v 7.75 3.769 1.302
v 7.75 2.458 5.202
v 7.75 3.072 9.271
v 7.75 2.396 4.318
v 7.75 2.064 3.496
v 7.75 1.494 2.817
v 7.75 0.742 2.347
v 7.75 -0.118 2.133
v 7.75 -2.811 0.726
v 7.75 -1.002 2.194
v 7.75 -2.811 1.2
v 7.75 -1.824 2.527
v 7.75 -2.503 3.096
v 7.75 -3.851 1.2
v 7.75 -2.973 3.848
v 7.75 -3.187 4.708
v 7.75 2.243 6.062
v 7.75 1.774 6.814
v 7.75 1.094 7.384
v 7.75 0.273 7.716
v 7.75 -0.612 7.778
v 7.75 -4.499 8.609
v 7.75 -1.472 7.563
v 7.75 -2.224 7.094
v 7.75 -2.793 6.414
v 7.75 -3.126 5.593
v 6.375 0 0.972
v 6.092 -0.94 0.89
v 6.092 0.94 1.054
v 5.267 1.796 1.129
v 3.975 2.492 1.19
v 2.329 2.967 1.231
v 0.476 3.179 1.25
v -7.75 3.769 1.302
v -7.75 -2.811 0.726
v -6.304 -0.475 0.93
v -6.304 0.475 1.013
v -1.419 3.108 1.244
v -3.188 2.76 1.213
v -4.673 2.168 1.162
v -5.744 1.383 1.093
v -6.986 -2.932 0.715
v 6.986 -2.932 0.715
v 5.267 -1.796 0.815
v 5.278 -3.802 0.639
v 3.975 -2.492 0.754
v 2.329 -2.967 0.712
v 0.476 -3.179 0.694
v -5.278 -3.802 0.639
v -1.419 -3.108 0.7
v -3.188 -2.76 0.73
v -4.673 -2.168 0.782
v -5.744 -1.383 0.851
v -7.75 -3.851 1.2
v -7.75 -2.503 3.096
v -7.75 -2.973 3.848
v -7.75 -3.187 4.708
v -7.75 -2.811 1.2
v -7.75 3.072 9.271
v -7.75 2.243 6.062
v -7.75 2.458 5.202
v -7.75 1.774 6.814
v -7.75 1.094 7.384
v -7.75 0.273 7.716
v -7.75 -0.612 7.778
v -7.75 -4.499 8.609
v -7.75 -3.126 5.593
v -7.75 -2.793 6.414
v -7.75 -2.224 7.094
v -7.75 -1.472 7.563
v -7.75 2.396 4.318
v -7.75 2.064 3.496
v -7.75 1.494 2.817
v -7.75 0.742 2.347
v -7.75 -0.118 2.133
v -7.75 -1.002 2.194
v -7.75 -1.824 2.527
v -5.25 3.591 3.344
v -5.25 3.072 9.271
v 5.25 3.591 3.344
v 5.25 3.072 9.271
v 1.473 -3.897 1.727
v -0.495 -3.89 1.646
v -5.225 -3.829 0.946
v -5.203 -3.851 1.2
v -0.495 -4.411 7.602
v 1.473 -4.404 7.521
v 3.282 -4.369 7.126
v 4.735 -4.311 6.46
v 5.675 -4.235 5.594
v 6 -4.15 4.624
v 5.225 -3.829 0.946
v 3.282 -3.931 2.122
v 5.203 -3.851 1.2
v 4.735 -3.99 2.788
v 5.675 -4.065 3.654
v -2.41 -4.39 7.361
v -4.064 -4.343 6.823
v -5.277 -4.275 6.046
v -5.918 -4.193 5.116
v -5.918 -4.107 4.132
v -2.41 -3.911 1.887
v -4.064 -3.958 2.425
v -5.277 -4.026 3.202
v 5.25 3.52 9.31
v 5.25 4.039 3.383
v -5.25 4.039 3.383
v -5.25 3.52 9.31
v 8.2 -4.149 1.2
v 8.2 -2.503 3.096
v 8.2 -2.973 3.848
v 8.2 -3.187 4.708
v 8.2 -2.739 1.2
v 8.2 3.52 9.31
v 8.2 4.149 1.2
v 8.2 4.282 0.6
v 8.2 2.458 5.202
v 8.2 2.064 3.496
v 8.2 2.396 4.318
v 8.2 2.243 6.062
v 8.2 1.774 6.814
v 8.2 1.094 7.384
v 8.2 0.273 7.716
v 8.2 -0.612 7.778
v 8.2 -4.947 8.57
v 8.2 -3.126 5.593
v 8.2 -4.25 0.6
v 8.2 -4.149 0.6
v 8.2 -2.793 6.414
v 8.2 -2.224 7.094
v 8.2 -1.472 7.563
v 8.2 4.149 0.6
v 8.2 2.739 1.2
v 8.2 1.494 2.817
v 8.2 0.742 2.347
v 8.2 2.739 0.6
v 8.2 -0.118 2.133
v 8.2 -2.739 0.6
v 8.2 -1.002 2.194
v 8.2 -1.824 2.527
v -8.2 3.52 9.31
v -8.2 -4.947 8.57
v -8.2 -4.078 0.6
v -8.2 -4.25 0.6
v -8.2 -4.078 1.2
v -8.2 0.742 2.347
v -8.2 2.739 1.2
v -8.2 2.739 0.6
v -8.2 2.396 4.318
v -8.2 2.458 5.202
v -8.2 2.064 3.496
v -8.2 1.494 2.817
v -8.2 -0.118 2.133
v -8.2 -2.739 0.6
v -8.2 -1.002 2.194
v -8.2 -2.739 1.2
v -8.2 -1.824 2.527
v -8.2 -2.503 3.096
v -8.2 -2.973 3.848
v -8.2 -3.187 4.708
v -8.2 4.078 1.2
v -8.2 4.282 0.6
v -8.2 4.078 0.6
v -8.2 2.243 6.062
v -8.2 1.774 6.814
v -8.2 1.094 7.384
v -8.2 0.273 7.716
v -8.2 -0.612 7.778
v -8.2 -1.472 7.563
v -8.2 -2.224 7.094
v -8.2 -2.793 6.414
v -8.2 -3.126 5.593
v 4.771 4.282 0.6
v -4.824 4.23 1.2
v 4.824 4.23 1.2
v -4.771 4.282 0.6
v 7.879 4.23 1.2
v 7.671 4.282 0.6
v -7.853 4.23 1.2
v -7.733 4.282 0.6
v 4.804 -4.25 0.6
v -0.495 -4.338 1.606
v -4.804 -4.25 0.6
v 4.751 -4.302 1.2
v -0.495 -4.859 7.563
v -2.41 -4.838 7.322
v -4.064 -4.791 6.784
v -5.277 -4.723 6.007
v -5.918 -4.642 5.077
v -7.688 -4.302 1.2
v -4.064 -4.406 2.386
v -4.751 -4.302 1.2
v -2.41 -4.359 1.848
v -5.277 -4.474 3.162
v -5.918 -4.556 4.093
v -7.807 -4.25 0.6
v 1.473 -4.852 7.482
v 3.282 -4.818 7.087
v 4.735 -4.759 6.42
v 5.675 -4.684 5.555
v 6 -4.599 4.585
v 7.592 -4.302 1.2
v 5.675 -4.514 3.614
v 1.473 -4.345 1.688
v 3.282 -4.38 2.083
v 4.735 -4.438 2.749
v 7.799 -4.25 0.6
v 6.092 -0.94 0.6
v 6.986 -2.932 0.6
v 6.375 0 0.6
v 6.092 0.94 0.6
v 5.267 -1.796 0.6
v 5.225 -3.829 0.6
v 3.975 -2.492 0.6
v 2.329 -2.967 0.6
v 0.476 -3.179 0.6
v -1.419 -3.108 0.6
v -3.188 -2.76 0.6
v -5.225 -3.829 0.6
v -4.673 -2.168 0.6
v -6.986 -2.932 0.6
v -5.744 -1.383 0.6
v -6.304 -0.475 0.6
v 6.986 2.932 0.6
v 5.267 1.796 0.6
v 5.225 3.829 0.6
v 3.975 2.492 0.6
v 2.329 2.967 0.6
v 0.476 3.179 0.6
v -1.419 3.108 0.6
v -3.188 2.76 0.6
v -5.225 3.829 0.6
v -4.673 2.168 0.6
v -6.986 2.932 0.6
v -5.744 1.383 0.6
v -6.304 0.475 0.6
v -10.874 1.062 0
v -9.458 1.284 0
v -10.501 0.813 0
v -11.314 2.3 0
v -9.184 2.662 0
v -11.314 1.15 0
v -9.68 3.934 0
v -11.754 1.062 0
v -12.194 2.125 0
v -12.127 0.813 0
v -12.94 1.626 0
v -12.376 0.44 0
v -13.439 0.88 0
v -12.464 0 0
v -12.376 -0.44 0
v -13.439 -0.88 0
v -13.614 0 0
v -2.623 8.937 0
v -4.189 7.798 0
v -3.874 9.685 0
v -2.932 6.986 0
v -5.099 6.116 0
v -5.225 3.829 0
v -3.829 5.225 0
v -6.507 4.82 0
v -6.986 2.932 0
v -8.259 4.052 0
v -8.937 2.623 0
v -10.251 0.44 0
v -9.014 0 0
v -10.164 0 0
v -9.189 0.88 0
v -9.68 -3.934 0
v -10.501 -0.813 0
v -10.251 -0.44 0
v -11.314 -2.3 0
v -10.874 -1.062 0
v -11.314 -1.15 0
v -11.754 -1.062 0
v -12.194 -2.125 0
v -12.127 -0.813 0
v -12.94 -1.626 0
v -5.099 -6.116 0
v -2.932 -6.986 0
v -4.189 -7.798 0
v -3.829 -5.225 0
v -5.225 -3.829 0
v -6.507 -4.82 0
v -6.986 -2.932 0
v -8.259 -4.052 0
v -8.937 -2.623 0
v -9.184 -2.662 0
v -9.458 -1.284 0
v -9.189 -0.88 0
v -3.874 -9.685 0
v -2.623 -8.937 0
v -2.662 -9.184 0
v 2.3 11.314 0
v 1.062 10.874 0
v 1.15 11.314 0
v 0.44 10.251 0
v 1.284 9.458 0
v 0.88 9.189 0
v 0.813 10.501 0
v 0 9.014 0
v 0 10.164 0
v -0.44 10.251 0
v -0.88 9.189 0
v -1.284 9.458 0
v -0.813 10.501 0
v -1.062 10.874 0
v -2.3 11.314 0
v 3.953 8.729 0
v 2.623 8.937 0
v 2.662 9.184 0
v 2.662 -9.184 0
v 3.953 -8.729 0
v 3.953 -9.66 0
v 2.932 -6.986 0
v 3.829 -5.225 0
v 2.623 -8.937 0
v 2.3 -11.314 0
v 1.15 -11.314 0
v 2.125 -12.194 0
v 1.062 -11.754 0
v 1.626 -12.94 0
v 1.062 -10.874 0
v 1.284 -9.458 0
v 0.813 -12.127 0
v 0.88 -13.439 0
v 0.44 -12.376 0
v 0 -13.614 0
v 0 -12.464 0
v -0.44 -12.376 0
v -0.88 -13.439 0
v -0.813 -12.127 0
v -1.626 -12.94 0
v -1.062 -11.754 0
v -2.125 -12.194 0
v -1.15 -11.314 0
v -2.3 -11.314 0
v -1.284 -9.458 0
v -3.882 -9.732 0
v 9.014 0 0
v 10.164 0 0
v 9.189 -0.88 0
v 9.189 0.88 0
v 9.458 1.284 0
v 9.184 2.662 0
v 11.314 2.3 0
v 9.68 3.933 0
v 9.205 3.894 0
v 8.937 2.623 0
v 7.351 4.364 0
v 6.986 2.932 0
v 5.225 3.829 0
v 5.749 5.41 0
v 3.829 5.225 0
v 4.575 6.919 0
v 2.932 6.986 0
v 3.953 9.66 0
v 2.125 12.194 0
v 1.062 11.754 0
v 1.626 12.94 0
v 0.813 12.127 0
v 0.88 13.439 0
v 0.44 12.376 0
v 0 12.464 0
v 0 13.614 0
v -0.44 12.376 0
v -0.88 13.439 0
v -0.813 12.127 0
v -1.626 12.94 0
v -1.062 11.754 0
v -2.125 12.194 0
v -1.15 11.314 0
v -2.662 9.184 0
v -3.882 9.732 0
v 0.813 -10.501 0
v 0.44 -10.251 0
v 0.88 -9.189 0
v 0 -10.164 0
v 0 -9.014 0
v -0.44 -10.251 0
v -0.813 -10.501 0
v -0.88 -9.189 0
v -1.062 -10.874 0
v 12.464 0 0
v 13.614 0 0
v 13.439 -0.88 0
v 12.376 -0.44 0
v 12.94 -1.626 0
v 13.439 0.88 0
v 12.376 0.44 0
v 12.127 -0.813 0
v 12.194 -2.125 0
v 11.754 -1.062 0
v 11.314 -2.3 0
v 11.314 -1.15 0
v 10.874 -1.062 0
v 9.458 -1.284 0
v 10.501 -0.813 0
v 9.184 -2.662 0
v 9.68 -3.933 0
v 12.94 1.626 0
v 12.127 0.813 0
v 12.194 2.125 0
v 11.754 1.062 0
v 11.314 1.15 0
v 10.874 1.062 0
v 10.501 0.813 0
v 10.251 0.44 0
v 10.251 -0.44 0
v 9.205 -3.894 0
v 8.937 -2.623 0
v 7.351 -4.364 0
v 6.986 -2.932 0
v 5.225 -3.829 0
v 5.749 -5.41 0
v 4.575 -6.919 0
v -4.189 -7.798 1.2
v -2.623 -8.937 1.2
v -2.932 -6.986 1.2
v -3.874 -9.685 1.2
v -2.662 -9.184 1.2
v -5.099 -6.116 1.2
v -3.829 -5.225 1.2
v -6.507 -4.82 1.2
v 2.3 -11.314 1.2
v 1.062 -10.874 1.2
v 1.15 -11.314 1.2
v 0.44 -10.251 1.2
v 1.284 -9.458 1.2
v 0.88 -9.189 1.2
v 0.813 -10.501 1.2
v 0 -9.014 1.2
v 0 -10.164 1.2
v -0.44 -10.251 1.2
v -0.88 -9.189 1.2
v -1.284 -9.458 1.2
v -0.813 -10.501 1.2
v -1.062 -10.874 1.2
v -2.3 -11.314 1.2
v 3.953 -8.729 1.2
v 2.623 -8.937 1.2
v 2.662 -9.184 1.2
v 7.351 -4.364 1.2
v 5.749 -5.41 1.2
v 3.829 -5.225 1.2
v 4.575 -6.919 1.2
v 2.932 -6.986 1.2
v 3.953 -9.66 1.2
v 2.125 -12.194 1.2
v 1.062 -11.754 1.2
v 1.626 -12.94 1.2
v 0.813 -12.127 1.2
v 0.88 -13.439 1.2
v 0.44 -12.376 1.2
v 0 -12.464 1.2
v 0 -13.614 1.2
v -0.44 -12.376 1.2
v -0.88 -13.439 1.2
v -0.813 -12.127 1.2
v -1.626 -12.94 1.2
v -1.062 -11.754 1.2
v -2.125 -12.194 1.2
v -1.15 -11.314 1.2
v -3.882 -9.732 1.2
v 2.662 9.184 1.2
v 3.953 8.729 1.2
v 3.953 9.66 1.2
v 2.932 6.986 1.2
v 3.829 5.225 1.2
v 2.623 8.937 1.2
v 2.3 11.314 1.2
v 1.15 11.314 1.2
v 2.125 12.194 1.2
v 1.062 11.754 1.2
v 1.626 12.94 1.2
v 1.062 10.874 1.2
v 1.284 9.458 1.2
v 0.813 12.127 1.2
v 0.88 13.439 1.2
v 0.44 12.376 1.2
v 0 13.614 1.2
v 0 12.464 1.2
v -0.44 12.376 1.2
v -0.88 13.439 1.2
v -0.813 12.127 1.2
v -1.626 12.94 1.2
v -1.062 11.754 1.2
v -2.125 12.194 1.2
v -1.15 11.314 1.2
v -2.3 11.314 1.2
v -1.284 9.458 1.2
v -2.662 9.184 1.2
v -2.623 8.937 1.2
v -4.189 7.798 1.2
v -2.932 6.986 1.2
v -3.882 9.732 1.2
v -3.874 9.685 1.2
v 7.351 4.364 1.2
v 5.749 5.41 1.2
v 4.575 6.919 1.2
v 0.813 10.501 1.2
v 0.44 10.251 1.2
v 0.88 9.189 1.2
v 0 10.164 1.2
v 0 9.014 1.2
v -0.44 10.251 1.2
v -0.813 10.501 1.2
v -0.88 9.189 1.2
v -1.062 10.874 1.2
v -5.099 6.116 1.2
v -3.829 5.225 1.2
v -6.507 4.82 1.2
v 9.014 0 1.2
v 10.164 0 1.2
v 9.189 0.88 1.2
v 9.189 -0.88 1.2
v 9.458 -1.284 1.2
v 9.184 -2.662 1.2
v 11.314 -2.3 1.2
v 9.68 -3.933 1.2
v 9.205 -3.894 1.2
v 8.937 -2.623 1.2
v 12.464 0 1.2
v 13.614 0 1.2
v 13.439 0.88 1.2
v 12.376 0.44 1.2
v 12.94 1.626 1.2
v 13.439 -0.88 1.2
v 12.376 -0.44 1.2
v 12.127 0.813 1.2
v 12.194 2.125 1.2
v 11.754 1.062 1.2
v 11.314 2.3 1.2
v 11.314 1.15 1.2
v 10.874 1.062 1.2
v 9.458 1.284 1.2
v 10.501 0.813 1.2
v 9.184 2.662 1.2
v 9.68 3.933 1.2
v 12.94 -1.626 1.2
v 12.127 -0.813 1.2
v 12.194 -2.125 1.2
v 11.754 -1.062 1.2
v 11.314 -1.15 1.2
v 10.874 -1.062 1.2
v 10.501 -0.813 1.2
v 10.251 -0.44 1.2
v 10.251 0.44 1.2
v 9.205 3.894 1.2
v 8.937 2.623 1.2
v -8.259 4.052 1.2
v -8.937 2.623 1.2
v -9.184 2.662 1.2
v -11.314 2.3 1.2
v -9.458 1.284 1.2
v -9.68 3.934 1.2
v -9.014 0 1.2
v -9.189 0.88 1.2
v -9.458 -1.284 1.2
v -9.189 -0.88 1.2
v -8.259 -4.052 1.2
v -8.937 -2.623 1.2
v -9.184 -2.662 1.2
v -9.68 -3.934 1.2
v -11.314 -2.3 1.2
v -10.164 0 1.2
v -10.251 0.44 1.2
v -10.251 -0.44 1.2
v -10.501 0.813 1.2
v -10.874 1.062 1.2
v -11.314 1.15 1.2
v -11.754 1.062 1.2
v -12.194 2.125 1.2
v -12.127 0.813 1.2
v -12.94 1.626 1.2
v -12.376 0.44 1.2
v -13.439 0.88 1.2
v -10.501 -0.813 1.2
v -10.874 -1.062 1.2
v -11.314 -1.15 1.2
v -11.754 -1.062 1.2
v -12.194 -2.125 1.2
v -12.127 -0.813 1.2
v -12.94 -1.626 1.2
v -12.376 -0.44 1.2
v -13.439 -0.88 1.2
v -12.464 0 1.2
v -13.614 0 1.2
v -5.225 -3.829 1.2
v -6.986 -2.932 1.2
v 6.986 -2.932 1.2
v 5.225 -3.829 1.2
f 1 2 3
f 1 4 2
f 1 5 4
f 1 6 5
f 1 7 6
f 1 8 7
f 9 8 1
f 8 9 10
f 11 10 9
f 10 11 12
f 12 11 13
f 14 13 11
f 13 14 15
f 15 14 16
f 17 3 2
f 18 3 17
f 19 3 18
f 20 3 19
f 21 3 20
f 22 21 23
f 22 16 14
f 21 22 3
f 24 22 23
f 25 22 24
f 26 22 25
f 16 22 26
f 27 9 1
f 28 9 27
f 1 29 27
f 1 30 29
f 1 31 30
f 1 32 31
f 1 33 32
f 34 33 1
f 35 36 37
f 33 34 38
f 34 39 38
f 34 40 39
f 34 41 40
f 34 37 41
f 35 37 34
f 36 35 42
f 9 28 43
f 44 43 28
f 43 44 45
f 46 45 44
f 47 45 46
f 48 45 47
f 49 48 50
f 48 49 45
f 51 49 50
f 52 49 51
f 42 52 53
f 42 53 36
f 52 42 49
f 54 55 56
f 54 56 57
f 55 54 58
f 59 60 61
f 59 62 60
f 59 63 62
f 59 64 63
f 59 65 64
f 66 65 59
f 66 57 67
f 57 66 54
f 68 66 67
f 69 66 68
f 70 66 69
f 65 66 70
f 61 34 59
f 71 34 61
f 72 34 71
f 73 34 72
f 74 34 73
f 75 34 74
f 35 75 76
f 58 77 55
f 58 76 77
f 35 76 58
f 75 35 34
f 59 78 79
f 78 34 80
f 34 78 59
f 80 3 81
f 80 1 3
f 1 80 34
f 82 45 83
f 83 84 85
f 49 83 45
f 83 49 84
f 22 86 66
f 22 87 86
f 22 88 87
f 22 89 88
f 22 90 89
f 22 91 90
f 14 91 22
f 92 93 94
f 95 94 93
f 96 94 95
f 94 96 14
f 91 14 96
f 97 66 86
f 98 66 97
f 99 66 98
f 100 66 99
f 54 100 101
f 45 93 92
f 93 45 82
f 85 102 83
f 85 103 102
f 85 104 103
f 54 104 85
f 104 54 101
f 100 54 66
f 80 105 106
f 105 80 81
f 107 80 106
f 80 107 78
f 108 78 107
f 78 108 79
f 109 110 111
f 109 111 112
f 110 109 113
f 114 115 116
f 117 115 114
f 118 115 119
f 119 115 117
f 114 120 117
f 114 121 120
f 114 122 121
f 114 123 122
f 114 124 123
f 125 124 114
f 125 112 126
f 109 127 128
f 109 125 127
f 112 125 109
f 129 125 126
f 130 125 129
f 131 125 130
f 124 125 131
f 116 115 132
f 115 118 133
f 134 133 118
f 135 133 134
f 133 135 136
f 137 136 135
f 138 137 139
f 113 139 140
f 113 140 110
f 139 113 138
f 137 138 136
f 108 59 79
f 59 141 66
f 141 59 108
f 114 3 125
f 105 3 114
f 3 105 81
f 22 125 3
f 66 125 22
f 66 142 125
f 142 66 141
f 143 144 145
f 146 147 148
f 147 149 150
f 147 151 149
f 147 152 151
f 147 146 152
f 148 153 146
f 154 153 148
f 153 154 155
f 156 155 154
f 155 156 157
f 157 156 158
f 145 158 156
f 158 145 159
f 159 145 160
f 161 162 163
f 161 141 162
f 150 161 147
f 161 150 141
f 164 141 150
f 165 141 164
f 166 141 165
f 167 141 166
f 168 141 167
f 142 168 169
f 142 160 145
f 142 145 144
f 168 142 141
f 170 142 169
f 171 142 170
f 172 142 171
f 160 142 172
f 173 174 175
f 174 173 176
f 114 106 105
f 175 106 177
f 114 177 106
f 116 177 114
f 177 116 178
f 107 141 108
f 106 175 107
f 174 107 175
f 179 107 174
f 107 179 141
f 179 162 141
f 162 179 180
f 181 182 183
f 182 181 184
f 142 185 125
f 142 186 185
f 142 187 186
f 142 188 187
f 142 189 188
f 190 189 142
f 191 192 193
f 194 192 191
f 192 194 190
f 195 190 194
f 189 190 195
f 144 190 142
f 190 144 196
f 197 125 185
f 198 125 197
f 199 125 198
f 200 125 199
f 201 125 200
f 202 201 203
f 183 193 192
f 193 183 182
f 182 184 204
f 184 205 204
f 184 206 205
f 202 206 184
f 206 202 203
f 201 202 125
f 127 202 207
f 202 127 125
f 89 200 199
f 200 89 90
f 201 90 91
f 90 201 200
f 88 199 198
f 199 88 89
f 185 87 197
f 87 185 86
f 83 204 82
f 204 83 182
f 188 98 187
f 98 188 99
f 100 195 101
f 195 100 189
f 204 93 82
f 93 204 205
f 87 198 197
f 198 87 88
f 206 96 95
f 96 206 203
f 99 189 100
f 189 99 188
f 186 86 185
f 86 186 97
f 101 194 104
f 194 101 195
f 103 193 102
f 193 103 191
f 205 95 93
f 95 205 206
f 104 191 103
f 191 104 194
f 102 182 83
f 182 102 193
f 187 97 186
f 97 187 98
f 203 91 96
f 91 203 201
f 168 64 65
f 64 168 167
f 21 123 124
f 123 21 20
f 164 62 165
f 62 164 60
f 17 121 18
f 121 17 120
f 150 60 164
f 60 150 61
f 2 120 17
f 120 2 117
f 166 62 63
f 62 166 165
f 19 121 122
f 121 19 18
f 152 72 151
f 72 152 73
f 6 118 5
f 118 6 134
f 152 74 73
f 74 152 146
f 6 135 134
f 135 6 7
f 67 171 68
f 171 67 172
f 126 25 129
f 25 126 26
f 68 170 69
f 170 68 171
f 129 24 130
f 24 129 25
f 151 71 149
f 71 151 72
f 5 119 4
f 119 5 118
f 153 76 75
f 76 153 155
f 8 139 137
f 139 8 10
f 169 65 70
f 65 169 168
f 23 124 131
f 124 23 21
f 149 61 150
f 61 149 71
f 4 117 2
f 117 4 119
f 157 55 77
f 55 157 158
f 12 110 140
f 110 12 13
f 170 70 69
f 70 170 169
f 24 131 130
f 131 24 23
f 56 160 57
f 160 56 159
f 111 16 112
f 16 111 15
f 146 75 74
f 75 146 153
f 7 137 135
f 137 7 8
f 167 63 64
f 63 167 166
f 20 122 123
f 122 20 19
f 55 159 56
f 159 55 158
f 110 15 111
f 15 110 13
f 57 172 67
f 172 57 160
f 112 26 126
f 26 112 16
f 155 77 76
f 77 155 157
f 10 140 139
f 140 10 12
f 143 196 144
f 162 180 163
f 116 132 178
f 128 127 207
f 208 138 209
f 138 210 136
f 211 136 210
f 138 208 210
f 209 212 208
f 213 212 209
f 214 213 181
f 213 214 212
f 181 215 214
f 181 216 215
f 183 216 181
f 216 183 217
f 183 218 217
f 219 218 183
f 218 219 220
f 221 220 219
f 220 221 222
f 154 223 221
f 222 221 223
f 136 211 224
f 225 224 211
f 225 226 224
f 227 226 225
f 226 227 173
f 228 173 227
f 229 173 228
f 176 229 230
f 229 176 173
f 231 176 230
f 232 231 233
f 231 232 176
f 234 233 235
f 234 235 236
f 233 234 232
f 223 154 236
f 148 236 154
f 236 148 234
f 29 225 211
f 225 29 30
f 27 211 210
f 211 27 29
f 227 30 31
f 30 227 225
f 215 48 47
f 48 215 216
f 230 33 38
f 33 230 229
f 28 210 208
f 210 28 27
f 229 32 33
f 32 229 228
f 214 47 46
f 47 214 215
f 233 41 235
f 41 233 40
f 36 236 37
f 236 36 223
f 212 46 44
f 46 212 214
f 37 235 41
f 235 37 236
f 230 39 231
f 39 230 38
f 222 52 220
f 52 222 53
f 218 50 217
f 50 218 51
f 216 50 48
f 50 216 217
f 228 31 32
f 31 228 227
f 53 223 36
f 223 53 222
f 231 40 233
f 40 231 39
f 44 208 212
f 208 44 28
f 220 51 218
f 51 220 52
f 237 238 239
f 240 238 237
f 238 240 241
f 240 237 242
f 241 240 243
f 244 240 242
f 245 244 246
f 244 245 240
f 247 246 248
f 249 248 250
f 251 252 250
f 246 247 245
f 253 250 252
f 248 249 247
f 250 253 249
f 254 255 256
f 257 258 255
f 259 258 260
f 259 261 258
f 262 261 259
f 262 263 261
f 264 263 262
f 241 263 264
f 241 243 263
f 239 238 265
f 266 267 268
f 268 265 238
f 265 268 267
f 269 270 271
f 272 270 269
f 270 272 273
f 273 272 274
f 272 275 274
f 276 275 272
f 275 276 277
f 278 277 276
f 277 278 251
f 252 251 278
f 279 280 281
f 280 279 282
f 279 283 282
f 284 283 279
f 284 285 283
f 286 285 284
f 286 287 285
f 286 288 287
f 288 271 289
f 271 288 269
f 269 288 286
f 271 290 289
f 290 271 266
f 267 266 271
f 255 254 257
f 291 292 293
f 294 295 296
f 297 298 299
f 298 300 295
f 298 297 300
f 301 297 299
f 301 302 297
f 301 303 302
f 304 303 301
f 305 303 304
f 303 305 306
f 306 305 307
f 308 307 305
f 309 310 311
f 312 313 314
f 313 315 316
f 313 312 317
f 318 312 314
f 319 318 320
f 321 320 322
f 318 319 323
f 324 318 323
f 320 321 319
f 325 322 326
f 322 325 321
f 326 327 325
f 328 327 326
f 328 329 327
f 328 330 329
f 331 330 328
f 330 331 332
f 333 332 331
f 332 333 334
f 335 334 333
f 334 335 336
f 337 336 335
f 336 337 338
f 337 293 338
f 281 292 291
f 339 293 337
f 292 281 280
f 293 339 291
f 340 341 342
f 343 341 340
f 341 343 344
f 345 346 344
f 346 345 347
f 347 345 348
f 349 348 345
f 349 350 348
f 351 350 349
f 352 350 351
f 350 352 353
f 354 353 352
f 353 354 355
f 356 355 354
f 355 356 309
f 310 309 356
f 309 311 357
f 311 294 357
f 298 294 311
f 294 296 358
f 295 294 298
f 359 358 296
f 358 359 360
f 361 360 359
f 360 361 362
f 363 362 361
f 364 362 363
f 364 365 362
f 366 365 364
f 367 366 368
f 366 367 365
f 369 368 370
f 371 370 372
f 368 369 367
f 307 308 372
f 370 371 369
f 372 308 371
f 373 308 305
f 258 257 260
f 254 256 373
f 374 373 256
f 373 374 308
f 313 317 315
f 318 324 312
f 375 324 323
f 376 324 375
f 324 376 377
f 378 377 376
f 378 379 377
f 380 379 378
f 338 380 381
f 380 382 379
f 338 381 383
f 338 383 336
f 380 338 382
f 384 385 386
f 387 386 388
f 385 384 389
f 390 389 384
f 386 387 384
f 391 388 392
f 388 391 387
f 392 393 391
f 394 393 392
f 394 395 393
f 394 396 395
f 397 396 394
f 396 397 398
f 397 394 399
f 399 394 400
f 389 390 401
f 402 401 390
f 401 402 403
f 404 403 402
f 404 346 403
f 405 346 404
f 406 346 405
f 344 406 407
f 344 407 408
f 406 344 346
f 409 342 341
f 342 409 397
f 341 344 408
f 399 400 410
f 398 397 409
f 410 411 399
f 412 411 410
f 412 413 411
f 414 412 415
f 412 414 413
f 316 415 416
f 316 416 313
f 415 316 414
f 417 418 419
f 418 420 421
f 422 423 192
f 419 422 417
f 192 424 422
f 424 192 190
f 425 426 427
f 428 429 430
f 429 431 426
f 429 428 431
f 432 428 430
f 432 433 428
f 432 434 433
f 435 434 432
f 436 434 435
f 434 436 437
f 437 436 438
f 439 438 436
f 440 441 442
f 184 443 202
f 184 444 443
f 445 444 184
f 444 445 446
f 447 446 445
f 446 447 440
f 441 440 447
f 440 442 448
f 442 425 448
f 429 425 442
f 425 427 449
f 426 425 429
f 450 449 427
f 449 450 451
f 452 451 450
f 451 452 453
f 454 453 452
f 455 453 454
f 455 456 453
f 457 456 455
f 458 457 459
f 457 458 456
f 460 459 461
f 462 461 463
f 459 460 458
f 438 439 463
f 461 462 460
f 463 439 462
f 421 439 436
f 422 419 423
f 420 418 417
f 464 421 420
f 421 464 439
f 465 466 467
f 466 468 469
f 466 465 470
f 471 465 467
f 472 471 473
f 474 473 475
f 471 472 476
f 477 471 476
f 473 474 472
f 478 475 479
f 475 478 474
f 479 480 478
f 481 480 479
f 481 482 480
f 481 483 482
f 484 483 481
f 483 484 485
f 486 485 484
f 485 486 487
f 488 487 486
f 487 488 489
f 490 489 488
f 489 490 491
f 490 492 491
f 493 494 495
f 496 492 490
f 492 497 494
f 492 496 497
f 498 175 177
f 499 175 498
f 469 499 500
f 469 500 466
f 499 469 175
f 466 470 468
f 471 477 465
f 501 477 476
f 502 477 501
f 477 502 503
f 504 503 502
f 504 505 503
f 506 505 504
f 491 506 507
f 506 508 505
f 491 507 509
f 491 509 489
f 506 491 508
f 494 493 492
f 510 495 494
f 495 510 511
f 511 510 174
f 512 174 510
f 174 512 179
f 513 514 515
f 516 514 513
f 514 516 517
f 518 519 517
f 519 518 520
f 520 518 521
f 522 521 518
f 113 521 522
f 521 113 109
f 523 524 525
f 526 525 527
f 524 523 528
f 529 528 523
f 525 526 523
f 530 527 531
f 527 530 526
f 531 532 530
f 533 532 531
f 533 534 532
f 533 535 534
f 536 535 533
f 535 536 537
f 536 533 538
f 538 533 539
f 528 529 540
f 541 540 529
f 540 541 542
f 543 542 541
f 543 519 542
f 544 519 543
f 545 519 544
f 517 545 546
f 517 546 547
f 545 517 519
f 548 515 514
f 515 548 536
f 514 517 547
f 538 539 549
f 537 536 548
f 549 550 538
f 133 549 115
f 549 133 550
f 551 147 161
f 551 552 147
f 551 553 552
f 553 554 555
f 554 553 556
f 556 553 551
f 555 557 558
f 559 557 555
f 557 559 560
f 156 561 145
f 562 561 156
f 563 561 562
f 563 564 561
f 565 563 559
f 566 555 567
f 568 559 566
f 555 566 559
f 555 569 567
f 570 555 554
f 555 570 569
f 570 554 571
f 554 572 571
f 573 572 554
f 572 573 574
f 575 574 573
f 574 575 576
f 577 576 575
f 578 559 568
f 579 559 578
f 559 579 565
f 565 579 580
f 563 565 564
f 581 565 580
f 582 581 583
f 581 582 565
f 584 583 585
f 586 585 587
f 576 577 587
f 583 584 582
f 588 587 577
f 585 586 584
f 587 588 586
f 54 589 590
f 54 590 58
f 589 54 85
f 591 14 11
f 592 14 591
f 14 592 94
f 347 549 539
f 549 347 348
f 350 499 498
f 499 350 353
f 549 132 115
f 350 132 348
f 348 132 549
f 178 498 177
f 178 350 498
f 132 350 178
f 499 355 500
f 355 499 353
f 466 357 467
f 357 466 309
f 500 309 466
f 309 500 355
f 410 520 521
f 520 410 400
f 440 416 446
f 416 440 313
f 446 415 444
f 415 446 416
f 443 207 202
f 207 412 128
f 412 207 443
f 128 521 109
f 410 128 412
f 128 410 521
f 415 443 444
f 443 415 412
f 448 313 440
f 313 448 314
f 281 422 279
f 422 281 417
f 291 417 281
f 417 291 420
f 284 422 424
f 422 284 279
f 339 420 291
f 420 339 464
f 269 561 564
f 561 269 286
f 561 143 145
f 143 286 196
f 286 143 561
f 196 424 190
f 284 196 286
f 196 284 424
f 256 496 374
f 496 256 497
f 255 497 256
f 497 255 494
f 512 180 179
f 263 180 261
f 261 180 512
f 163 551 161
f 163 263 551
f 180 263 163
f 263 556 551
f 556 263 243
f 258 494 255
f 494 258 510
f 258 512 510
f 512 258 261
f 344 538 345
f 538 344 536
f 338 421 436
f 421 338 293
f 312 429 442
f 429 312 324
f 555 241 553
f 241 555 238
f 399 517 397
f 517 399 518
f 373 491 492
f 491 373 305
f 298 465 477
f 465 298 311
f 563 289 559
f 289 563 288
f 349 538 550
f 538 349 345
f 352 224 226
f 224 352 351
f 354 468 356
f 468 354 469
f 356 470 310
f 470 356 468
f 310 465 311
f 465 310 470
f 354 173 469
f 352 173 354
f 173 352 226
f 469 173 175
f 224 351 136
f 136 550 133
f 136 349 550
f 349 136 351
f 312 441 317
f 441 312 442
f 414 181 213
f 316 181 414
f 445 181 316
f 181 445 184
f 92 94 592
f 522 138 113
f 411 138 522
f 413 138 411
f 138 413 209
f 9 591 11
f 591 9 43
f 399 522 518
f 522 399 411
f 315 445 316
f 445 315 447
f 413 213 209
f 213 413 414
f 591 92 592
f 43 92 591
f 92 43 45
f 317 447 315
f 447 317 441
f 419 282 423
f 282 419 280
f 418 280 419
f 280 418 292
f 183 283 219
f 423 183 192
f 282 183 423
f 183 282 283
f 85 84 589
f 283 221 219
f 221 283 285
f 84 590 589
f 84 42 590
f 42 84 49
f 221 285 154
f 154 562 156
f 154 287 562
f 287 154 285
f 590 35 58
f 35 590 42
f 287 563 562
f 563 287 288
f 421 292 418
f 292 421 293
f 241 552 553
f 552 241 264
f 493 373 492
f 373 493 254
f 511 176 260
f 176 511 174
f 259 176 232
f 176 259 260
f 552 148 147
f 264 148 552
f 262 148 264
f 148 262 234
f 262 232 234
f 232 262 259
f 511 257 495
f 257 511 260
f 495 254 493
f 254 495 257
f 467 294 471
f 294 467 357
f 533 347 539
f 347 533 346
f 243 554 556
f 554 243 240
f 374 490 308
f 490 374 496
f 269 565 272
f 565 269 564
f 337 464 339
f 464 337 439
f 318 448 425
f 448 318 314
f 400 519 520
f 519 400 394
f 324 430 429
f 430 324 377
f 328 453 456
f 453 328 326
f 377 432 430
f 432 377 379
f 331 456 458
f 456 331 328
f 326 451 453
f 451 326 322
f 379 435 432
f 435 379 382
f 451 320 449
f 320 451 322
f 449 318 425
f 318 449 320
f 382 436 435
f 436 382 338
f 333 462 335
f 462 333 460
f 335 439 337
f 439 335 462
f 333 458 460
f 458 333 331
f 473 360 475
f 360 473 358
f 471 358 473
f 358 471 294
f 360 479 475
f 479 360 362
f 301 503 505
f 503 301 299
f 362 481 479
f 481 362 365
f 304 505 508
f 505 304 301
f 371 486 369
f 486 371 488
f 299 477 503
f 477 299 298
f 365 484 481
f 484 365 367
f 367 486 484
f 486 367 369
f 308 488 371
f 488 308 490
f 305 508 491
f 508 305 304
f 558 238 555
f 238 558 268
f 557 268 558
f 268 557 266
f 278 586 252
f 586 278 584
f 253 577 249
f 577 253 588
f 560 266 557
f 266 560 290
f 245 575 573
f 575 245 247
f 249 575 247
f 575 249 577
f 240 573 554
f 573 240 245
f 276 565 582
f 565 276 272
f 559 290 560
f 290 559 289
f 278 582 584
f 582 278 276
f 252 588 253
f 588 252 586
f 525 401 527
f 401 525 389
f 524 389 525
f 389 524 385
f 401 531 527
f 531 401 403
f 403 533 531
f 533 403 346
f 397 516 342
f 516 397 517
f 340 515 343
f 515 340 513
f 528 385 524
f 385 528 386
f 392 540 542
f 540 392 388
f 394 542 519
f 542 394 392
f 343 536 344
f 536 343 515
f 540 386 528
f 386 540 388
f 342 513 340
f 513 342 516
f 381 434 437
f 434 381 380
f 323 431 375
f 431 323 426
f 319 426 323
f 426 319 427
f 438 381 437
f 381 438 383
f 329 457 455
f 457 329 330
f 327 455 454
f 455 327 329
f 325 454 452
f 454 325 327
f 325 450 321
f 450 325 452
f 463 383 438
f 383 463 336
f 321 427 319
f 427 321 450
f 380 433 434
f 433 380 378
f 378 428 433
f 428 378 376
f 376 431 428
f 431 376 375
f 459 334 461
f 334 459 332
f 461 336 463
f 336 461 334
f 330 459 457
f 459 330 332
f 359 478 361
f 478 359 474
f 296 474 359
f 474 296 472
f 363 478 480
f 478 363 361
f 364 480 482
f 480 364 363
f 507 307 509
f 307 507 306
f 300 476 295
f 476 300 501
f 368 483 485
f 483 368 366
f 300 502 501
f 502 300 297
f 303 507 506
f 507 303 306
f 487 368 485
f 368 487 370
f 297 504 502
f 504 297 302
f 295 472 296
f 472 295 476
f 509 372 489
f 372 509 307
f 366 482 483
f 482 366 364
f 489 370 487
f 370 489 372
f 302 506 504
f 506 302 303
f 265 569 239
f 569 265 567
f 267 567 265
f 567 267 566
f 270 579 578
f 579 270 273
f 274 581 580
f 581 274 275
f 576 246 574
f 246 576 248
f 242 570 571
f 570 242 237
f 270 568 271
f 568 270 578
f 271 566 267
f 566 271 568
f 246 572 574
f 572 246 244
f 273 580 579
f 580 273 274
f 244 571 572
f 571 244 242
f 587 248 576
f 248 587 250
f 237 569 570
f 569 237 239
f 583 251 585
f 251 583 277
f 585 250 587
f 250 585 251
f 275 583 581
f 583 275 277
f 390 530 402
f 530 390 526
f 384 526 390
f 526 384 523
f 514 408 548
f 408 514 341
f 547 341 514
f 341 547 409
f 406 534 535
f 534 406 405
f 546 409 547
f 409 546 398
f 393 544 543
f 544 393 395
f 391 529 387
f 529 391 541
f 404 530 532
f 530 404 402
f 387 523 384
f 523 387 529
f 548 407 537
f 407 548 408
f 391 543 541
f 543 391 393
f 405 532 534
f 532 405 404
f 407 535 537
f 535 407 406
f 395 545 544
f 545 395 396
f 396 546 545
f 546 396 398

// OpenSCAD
/* [Camera box] */

// Camera box angle
CAMERABOX_ANGLE = 5; // 15;
// Camera box height
CAMERABOX_HEIGHT = 8;
// Camera box wall thickness
CAMERABOX_WALL_THICKNESS = 0.9;
// Extra height at bottom of the box
CAMERABOX_ZOFFSET = 0;

/* [Customize camera] */
// Draw camera (debug mode)
//CAMERA_DEBUG="true"; /*
CAMERA_DEBUG="false";
//*/

// Camera width
CAMERA_WIDTH = 15.5;
// Camera depth
CAMERA_DEPTH = 7.6;
// Camera height
CAMERA_HEIGHT = 12.4;

// Lens width
CAMERA_LENS_WIDTH = 10.5;
// Lens height
CAMERA_LENS_HEIGHT = 9.5;
// Lens depth
CAMERA_LENS_DEPTH = 8.5;
// Lens cutout offset X from center of camera
CAMERA_LENS_XOFFSET = 0;
// Lens offset Z from center of camera
CAMERA_LENS_ZOFFSET = 0.6;

// Front capacitor width
CAMERA_CAP_WIDTH=0;
// Front capacitor height
CAMERA_CAP_HEIGHT = 0;
// Front capacitor depth
CAMERA_CAP_DEPTH = 0;
// Front capacitor X offset from center of lens
CAMERA_CAP_XOFFSET = -1.3;
// Front capacitor Y offset from center of the lens
CAMERA_CAP_ZOFFSET = -4.75;

// Rear LCD width
CAMERA_LCD_WIDTH = 0;
// Rear LCD height
CAMERA_LCD_HEIGHT = 0;
// Rear LCD depth
CAMERA_LCD_DEPTH = 0;
// Rear LCD X offset
CAMERA_LCD_XOFFSET = -6;
// Rear LCD Z offset
CAMERA_LCD_ZOFFSET = 1.5;

// Power cord's connector width
CAMERA_POWERCORD_WIDTH=2;
// Power cord's connector height
CAMERA_POWERCORD_HEIGHT=5;
// Power cord's connector depth
CAMERA_POWERCORD_DEPTH=0;
// Power cord's hole X offset
CAMERA_POWERCORD_XOFFSET = 6.75;
// Power cord's hole z offset
CAMERA_POWERCORD_ZOFFSET = -2.2;

/* [Customize Camera box (advanced)] */
// Custom camera box width (empty is default)
CAMERABOX_WIDTH = CAMERA_WIDTH + CAMERABOX_WALL_THICKNESS;
// Custom camera box depth (empty is default)
CAMERABOX_DEPTH = CAMERA_DEPTH + CAMERABOX_WALL_THICKNESS;

/* [Customize support plate] */
// Spacing between frame's holes
PLATE_HOLE_SPACING = 16 * sqrt(2);
// Hole's diameter
PLATE_HOLE_DIAMETER = 2;
// Extra width between frame's holes center and the support plate's outer edge
PLATE_INNER_WIDTH = 1.6;
// height of the plate
PLATE_THICKNESS = 1.2;
// Yaw offset, use 45 for "X" frame, 0 for "+" frame
PLATE_YAW_OFFSET = 0;
// X offset for the plate
PLATE_XOFFSET = 0;
// y offset for the plate
PLATE_YOFFSET = 0;
// z offset for the plate
PLATE_ZOFFSET = PLATE_THICKNESS / 2.0;

/* [Customize support plate (advanced)] */
// Radius of the plate
PLATE_RADIUS = (PLATE_HOLE_SPACING + (PLATE_INNER_WIDTH * 2.0)) / 2.0;

// Outer cut's radius
PLATE_OUTERCUT_RADIUS = 0.45 * PLATE_RADIUS;
// Outer cut's distance from the plate's center
PLATE_OUTERCUT_CENTER_DISTANCE = 0.75 * PLATE_RADIUS;

// Inner radius
PLATE_INNER_RADIUS = (PLATE_HOLE_SPACING - (PLATE_INNER_WIDTH * 2)) / 2.0;
// Inner cut's radius
PLATE_INNERCUT_RADIUS = 0.65 * PLATE_INNER_RADIUS;
// Inner cut's distance from the plate's center
PLATE_INNERCUT_CENTER_DISTANCE = 0.92 * PLATE_INNER_RADIUS;

// Adjustment coefficient for the hole's diameter (makes the hole a bit larger to accomodate higher flow rate)
PLATE_HOLE_DIAMETER_ADJUST = 0.15;

/* RENDER EVERYTHING */
translate([0,0,PLATE_THICKNESS/2]) camerabox();
plate();

/* DRAW PLATE */
module plate() {
                    // Holes
    PLATE_HOLE_RADIUS = ((PLATE_HOLE_DIAMETER * PLATE_HOLE_DIAMETER_ADJUST) + PLATE_HOLE_DIAMETER) / 2;

    translate([PLATE_XOFFSET, PLATE_YOFFSET, PLATE_ZOFFSET])
        rotate([0, 0, PLATE_YAW_OFFSET])
            difference(){
                union(){
                    difference() {
                        // Outer               
                        partialPlate(PLATE_RADIUS, PLATE_THICKNESS, PLATE_OUTERCUT_RADIUS, PLATE_OUTERCUT_CENTER_DISTANCE);
                        // Inner
                        partialPlate(PLATE_INNER_RADIUS, 1.1 * PLATE_THICKNESS, PLATE_INNERCUT_RADIUS, PLATE_INNERCUT_CENTER_DISTANCE);
                        // external cut-outs
                        shf = PLATE_HOLE_RADIUS*2 +PLATE_HOLE_SPACING/2;
                        translate([shf,0,-PLATE_THICKNESS/2]) rotate([0,0,45]) cube([PLATE_HOLE_SPACING,PLATE_HOLE_SPACING*2,1.1 * PLATE_THICKNESS]);
                        
                        rotate ([0,0,90]) translate([shf,0,-PLATE_THICKNESS/2]) rotate([0,0,45]) cube([PLATE_HOLE_SPACING,PLATE_HOLE_SPACING*2,1.1 * PLATE_THICKNESS]);
                        
                       
                        rotate ([0,0,180]) translate([shf,0,-PLATE_THICKNESS/2]) rotate([0,0,45]) cube([PLATE_HOLE_SPACING,PLATE_HOLE_SPACING*2,1.1 * PLATE_THICKNESS]);
                        
                        rotate ([0,0,270]) translate([shf,0,-PLATE_THICKNESS/2]) rotate([0,0,45]) cube([PLATE_HOLE_SPACING,PLATE_HOLE_SPACING*2,1.1 * PLATE_THICKNESS]);
                    }
                 
                    // plate around holes
                    translate([0, -PLATE_HOLE_SPACING / 2.0, 0]) cylinder(r=PLATE_HOLE_RADIUS*2, h=PLATE_THICKNESS, center=true, $fn=16);
                    translate([0, PLATE_HOLE_SPACING / 2.0, 0]) cylinder(r=PLATE_HOLE_RADIUS*2, h=PLATE_THICKNESS, center=true, $fn=16);

                    translate([-PLATE_HOLE_SPACING / 2.0, 0, 0]) cylinder(r=PLATE_HOLE_RADIUS*2, h=PLATE_THICKNESS, center=true, $fn=16);
                    translate([PLATE_HOLE_SPACING / 2.0,0, 0]) cylinder(r=PLATE_HOLE_RADIUS*2, h=PLATE_THICKNESS, center=true, $fn=16);                
                    
                }
                //translate([-PLATE_RADIUS, -CAMERABOX_DEPTH / 2.0 - 2 * PLATE_INNER_WIDTH, -PLATE_ZOFFSET]) cube([PLATE_RADIUS - CAMERABOX_WIDTH / 2.0, CAMERABOX_DEPTH+ 4 * PLATE_INNER_WIDTH, PLATE_THICKNESS]);
                //translate([CAMERABOX_WIDTH/2, -CAMERABOX_DEPTH / 2.0 - 2 * PLATE_INNER_WIDTH, -PLATE_ZOFFSET])cube([PLATE_RADIUS - CAMERABOX_WIDTH / 2.0, CAMERABOX_DEPTH+ 4 * PLATE_INNER_WIDTH, PLATE_THICKNESS]);
                // holes
                translate([0, -PLATE_HOLE_SPACING / 2.0, 0])
                    cylinder(r=PLATE_HOLE_RADIUS, h=1.1*PLATE_THICKNESS, center=true, $fn=16);
                translate([0, PLATE_HOLE_SPACING / 2.0, 0])
                    cylinder(r=PLATE_HOLE_RADIUS, h=1.1*PLATE_THICKNESS, center=true, $fn=16);

                translate([-PLATE_HOLE_SPACING / 2.0, 0, 0])
                    cylinder(r=PLATE_HOLE_RADIUS, h=1.1*PLATE_THICKNESS, center=true, $fn=16);
                translate([PLATE_HOLE_SPACING / 2.0,0, 0])
                    cylinder(r=PLATE_HOLE_RADIUS, h=1.1*PLATE_THICKNESS, center=true, $fn=16);                
            }
            
}
        
module partialPlate(RADIUS, THICKNESS, CUT_RADIUS, CUT_DISTANCE) {
    difference() {
		cylinder(r=RADIUS, h=THICKNESS, center=true, $fn=16);        
		translate([CUT_DISTANCE, CUT_DISTANCE, 0])
			cylinder(r=CUT_RADIUS, h=THICKNESS + 1, center=true);
		translate([CUT_DISTANCE, -CUT_DISTANCE, 0])
			cylinder(r=CUT_RADIUS, h=THICKNESS + 1, center=true);
		translate([-CUT_DISTANCE, -CUT_DISTANCE, 0])
			cylinder(r=CUT_RADIUS, h=THICKNESS + 1, center=true);        
		translate([-CUT_DISTANCE, CUT_DISTANCE, 0])
			cylinder(r=CUT_RADIUS, h=THICKNESS + 1, center=true);
	}
}

/* DRAW CAMERA BOX */
module camerabox() {
    translate([-CAMERABOX_WIDTH/2, -CAMERABOX_DEPTH/2, 0]) { // Center model
        undersideExtraHeight = (CAMERABOX_ANGLE + 1) / 3;
        /* Draw camera box */
        difference() {
            rotate ([CAMERABOX_ANGLE, 0, 0]) {
                difference() {
                    
                    translate([0, 0, -undersideExtraHeight]) cube([CAMERABOX_WIDTH, CAMERABOX_DEPTH, CAMERABOX_HEIGHT + CAMERABOX_ZOFFSET + undersideExtraHeight]);
                    translate([CAMERABOX_WIDTH / 2 - CAMERA_WIDTH / 2, CAMERABOX_DEPTH / 2 - CAMERA_DEPTH / 2, CAMERABOX_ZOFFSET])
                        for(z = [0:CAMERABOX_HEIGHT]) translate([0,0,z]) camera();
                    // hole in a rear side
                    translate([CAMERABOX_WIDTH/2,CAMERABOX_DEPTH/2,CAMERABOX_HEIGHT/2]) rotate([90,0,0]) scale([1,0.5,1]) cylinder(r=CAMERABOX_HEIGHT/2*1.5, h=CAMERABOX_DEPTH*1.1);
                    //holes in left&right sides
                    translate([0,CAMERABOX_DEPTH/2,CAMERABOX_HEIGHT/2]) rotate([90,0,90]) cylinder(r=CAMERABOX_DEPTH/3, h=CAMERABOX_WIDTH*1.1,$fn=20);
                }
                
            }
            /* Cut bottom flat */
            translate ([-1, -CAMERABOX_HEIGHT, -CAMERABOX_HEIGHT*2])
                cube([ CAMERABOX_WIDTH + 2, CAMERABOX_DEPTH*3, CAMERABOX_HEIGHT*2]);
            
            // hole in a bottom
            translate([CAMERABOX_WIDTH/2,CAMERABOX_DEPTH/2,0]) scale([1,0.5,1])cylinder(r=CAMERABOX_DEPTH/2*1.5, h=40);
        }

        /* Draw camera (debug) */
        if (CAMERA_DEBUG == "true") {
            rotate ([CAMERABOX_ANGLE, 0, 0]) 
                translate([CAMERABOX_WIDTH / 2 - CAMERA_WIDTH / 2, CAMERABOX_DEPTH / 2 - CAMERA_DEPTH / 2, CAMERABOX_ZOFFSET])
                    camera();
        }
    }
}

/* DRAW CAMERA */
module camera() {
    translate([CAMERA_WIDTH / 2, CAMERA_DEPTH / 2, CAMERA_HEIGHT / 2]) {
        /* Body */
        color("darkgreen") cube([CAMERA_WIDTH, CAMERA_DEPTH, CAMERA_HEIGHT], center = true);
        /* Lens */
        translate([CAMERA_LENS_XOFFSET, 0, CAMERA_LENS_ZOFFSET])
            translate([0, CAMERA_DEPTH / 2 + CAMERA_LENS_DEPTH / 2, 0])
                color("darkgrey") cube([CAMERA_LENS_WIDTH, CAMERA_LENS_DEPTH, CAMERA_LENS_HEIGHT], center = true);
        /* Capacitor */
        translate([CAMERA_CAP_XOFFSET, 0, CAMERA_CAP_ZOFFSET])
            translate([0, CAMERA_DEPTH / 2 + CAMERA_CAP_DEPTH / 2, 0])
                color("yellow") cube([CAMERA_CAP_WIDTH, CAMERA_CAP_DEPTH, CAMERA_CAP_HEIGHT], center = true);
        /* Rear LCD */
        translate([CAMERA_LCD_XOFFSET, 0, CAMERA_LCD_ZOFFSET])
            translate([0, -  (CAMERA_DEPTH / 2 + CAMERA_LCD_DEPTH / 2), 0])
                color("grey") cube([CAMERA_LCD_WIDTH, CAMERA_LCD_DEPTH, CAMERA_LCD_HEIGHT], center = true);
        /* Power cord */
        translate([CAMERA_POWERCORD_XOFFSET, 0, CAMERA_POWERCORD_ZOFFSET])
            translate([0, -  (CAMERA_DEPTH / 2 + CAMERA_POWERCORD_DEPTH / 2), 0])
                color("black") cube([CAMERA_POWERCORD_WIDTH, CAMERA_POWERCORD_DEPTH, CAMERA_POWERCORD_HEIGHT], center = true);
    }
}
